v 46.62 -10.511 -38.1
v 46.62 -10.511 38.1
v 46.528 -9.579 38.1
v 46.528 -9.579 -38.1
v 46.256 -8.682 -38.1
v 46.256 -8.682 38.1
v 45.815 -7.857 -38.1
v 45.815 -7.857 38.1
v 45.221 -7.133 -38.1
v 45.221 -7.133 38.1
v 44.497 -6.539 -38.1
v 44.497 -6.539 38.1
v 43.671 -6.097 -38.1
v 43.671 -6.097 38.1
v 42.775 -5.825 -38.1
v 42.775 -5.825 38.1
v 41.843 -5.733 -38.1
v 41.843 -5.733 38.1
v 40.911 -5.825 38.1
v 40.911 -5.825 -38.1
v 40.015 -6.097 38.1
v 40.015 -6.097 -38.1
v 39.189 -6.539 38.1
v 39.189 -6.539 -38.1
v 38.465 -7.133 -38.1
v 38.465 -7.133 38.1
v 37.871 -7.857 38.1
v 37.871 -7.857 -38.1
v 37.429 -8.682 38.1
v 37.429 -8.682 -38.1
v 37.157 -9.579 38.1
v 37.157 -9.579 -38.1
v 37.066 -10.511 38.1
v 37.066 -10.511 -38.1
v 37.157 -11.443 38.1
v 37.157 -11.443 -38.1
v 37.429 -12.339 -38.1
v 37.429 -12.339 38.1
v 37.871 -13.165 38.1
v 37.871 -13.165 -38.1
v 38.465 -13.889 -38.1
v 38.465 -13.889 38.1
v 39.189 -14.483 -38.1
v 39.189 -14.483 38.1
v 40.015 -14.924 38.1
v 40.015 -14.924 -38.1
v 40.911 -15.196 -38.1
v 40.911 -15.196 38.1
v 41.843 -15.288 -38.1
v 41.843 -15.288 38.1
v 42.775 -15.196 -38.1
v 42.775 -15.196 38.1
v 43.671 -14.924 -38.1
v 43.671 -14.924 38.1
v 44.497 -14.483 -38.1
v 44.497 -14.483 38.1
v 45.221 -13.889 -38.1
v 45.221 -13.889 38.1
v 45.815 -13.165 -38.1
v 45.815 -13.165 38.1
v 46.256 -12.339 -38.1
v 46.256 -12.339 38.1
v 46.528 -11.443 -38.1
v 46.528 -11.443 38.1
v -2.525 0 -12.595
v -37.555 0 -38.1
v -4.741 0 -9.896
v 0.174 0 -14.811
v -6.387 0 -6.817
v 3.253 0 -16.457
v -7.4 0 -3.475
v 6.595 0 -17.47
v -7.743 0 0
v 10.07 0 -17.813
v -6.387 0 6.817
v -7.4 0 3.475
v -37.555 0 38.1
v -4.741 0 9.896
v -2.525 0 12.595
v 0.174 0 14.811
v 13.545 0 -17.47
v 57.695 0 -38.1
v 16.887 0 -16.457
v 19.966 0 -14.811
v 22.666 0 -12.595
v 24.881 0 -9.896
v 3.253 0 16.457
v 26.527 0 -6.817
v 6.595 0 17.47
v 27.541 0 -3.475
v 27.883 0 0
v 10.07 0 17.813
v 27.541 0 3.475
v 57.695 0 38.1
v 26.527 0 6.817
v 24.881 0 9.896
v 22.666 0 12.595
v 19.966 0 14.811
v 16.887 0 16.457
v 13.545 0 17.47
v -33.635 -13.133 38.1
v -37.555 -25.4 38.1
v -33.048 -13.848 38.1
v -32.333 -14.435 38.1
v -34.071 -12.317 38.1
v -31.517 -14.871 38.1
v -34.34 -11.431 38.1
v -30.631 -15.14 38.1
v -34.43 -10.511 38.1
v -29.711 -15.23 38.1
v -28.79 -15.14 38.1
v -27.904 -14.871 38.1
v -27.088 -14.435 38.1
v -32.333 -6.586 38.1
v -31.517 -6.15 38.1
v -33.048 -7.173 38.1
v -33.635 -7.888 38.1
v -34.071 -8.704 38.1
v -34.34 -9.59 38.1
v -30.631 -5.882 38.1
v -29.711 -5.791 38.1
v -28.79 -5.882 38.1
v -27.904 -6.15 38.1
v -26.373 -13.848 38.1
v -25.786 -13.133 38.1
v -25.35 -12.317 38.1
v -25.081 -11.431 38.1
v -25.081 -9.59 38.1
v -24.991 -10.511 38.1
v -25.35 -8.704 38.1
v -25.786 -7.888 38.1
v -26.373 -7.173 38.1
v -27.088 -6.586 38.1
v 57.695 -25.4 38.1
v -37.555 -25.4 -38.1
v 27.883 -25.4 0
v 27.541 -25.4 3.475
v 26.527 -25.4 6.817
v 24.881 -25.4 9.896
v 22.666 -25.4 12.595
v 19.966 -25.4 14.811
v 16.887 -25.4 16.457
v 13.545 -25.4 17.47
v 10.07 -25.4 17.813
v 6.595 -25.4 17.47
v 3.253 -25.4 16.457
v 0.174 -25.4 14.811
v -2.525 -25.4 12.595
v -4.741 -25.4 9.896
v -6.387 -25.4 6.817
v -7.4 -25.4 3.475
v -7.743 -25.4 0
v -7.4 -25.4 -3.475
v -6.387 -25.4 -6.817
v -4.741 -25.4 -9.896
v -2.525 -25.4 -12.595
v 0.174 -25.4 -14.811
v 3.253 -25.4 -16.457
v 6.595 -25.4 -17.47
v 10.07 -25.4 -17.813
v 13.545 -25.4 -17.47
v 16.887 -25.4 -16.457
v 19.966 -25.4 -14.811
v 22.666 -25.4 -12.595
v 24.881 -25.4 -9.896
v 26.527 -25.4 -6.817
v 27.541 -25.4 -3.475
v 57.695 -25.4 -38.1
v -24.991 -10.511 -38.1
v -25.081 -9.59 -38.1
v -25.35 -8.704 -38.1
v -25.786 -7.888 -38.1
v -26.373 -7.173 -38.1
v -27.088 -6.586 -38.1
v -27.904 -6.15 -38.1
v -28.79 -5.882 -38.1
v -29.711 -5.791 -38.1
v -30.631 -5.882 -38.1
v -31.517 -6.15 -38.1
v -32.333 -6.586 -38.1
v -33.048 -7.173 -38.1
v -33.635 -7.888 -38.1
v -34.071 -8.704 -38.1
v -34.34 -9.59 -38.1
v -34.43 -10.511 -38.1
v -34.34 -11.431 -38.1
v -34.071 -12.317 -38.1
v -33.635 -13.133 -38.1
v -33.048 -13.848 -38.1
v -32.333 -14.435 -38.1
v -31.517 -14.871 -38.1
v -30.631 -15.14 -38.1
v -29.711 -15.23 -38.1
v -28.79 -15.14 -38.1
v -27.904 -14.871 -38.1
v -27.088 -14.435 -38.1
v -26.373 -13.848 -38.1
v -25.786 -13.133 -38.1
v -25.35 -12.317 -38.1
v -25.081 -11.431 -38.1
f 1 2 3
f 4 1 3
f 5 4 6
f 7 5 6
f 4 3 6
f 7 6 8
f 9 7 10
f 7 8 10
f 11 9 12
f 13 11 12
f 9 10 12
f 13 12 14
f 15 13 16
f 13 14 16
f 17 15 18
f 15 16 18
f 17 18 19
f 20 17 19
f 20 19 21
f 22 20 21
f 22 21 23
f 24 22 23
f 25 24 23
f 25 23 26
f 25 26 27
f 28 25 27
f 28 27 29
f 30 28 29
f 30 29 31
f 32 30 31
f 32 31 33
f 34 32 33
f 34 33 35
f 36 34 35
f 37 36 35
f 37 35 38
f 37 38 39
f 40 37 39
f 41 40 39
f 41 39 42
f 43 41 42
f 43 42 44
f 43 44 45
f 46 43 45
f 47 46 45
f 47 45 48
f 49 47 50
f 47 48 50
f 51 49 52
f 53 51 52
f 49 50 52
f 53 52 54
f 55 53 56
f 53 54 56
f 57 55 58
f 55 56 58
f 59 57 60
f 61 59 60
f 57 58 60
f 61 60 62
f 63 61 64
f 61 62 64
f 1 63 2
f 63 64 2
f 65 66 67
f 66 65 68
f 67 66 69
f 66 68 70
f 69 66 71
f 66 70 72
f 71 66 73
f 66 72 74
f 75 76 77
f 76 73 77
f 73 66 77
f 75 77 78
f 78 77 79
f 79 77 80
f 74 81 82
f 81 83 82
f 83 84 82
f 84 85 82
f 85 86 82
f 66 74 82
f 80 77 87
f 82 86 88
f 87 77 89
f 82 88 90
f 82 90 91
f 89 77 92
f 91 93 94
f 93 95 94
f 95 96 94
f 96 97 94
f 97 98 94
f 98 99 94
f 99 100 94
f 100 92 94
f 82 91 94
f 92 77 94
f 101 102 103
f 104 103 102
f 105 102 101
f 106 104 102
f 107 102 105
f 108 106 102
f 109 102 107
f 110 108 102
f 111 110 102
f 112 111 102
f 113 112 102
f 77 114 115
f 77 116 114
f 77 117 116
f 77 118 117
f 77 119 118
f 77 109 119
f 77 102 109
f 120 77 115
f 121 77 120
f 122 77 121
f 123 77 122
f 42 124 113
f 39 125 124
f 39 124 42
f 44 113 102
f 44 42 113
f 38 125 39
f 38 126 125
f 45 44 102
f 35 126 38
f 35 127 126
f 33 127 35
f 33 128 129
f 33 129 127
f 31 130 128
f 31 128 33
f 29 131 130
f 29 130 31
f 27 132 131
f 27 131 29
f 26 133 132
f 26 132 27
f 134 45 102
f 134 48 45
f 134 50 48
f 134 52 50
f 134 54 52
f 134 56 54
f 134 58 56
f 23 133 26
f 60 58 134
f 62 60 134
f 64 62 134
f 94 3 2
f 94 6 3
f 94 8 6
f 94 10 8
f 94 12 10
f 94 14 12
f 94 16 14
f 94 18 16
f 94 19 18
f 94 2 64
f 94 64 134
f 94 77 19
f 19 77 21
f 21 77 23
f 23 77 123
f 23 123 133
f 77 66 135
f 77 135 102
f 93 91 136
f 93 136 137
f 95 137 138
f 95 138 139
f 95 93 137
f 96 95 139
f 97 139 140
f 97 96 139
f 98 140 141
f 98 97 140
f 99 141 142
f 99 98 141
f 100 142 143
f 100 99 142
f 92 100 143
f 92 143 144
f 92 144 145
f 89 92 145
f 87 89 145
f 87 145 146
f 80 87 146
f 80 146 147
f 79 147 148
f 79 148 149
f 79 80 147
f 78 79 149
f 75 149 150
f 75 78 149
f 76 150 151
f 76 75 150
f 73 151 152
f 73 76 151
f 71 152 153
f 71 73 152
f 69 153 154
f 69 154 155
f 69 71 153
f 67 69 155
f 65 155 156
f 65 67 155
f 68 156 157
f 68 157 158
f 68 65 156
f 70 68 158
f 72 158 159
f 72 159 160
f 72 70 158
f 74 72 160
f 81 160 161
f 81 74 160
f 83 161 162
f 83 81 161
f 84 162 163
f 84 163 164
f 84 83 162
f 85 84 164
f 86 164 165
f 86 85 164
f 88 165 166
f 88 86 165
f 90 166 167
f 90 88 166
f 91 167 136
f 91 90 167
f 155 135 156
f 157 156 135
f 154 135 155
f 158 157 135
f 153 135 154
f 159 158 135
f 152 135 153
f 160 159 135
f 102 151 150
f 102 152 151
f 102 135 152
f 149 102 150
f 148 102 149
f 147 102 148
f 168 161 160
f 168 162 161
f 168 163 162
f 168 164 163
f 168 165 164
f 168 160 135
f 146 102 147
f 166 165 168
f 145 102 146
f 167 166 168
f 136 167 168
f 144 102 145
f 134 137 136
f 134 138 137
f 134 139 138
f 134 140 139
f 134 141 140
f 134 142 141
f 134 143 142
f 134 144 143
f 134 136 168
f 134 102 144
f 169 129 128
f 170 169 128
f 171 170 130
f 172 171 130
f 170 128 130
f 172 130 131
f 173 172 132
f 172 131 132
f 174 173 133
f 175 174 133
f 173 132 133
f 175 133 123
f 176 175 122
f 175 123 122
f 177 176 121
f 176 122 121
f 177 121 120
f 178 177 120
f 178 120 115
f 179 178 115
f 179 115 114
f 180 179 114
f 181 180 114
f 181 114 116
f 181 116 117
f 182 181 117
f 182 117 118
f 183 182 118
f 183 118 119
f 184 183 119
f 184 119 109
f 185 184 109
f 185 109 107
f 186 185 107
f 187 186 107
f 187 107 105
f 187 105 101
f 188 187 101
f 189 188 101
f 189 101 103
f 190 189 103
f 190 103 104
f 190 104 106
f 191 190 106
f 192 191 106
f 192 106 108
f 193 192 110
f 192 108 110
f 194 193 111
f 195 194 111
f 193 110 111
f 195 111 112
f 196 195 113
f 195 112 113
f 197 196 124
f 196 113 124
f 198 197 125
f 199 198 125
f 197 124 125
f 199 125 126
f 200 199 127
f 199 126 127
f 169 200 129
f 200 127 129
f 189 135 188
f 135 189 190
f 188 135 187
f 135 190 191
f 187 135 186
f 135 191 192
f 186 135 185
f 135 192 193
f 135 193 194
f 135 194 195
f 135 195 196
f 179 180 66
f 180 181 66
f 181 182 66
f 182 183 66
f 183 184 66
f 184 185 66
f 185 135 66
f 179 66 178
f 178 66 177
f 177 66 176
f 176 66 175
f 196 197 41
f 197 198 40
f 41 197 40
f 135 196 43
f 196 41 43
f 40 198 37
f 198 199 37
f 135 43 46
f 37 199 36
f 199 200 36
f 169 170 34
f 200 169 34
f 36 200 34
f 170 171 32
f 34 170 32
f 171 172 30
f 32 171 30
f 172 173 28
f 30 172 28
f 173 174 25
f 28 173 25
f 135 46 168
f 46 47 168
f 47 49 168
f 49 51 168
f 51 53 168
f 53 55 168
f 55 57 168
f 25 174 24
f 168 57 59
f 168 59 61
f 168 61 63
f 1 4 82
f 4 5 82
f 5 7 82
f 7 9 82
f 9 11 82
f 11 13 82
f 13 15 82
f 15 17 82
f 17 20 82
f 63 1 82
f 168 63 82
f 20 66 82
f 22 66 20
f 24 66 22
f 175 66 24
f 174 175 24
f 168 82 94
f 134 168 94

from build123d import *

# Parameters (mm, degrees)
F0_W     = 95.25
F0_H     = 76.2
F0_R     = 17.812688
F1_DEPTH = 25.4
F2_R     = 4.71978
F2_R_2   = 4.777232
F3_DEPTH = 254
F4_DEPTH = 254


with BuildPart() as f1:
    # F0 (on Front) → F1 (new body)
    with BuildSketch(Plane.XZ):
        with Locations((10.070114, 0)):
            Rectangle(F0_W, F0_H)
        with Locations((10.070114, 0)):
            Circle(F0_R, mode=Mode.SUBTRACT)
    extrude(amount=F1_DEPTH)

    # F2 (on face) → F3 (cut)
    with BuildSketch(Plane.XY.offset(38.1)):
        with Locations((-29.710518, -10.510667)):
            Circle(F2_R)
        with Locations((41.842777, -10.510667)):
            Circle(F2_R_2)
    extrude(amount=-F3_DEPTH, mode=Mode.SUBTRACT)

    # F2 (on face) → F4 (cut)
    with BuildSketch(Plane.XY.offset(38.1)):
        with Locations((-29.710518, -10.510667)):
            Circle(F2_R)
        with Locations((41.842777, -10.510667)):
            Circle(F2_R_2)
    extrude(amount=-F4_DEPTH, mode=Mode.SUBTRACT)


solid = f1.part
